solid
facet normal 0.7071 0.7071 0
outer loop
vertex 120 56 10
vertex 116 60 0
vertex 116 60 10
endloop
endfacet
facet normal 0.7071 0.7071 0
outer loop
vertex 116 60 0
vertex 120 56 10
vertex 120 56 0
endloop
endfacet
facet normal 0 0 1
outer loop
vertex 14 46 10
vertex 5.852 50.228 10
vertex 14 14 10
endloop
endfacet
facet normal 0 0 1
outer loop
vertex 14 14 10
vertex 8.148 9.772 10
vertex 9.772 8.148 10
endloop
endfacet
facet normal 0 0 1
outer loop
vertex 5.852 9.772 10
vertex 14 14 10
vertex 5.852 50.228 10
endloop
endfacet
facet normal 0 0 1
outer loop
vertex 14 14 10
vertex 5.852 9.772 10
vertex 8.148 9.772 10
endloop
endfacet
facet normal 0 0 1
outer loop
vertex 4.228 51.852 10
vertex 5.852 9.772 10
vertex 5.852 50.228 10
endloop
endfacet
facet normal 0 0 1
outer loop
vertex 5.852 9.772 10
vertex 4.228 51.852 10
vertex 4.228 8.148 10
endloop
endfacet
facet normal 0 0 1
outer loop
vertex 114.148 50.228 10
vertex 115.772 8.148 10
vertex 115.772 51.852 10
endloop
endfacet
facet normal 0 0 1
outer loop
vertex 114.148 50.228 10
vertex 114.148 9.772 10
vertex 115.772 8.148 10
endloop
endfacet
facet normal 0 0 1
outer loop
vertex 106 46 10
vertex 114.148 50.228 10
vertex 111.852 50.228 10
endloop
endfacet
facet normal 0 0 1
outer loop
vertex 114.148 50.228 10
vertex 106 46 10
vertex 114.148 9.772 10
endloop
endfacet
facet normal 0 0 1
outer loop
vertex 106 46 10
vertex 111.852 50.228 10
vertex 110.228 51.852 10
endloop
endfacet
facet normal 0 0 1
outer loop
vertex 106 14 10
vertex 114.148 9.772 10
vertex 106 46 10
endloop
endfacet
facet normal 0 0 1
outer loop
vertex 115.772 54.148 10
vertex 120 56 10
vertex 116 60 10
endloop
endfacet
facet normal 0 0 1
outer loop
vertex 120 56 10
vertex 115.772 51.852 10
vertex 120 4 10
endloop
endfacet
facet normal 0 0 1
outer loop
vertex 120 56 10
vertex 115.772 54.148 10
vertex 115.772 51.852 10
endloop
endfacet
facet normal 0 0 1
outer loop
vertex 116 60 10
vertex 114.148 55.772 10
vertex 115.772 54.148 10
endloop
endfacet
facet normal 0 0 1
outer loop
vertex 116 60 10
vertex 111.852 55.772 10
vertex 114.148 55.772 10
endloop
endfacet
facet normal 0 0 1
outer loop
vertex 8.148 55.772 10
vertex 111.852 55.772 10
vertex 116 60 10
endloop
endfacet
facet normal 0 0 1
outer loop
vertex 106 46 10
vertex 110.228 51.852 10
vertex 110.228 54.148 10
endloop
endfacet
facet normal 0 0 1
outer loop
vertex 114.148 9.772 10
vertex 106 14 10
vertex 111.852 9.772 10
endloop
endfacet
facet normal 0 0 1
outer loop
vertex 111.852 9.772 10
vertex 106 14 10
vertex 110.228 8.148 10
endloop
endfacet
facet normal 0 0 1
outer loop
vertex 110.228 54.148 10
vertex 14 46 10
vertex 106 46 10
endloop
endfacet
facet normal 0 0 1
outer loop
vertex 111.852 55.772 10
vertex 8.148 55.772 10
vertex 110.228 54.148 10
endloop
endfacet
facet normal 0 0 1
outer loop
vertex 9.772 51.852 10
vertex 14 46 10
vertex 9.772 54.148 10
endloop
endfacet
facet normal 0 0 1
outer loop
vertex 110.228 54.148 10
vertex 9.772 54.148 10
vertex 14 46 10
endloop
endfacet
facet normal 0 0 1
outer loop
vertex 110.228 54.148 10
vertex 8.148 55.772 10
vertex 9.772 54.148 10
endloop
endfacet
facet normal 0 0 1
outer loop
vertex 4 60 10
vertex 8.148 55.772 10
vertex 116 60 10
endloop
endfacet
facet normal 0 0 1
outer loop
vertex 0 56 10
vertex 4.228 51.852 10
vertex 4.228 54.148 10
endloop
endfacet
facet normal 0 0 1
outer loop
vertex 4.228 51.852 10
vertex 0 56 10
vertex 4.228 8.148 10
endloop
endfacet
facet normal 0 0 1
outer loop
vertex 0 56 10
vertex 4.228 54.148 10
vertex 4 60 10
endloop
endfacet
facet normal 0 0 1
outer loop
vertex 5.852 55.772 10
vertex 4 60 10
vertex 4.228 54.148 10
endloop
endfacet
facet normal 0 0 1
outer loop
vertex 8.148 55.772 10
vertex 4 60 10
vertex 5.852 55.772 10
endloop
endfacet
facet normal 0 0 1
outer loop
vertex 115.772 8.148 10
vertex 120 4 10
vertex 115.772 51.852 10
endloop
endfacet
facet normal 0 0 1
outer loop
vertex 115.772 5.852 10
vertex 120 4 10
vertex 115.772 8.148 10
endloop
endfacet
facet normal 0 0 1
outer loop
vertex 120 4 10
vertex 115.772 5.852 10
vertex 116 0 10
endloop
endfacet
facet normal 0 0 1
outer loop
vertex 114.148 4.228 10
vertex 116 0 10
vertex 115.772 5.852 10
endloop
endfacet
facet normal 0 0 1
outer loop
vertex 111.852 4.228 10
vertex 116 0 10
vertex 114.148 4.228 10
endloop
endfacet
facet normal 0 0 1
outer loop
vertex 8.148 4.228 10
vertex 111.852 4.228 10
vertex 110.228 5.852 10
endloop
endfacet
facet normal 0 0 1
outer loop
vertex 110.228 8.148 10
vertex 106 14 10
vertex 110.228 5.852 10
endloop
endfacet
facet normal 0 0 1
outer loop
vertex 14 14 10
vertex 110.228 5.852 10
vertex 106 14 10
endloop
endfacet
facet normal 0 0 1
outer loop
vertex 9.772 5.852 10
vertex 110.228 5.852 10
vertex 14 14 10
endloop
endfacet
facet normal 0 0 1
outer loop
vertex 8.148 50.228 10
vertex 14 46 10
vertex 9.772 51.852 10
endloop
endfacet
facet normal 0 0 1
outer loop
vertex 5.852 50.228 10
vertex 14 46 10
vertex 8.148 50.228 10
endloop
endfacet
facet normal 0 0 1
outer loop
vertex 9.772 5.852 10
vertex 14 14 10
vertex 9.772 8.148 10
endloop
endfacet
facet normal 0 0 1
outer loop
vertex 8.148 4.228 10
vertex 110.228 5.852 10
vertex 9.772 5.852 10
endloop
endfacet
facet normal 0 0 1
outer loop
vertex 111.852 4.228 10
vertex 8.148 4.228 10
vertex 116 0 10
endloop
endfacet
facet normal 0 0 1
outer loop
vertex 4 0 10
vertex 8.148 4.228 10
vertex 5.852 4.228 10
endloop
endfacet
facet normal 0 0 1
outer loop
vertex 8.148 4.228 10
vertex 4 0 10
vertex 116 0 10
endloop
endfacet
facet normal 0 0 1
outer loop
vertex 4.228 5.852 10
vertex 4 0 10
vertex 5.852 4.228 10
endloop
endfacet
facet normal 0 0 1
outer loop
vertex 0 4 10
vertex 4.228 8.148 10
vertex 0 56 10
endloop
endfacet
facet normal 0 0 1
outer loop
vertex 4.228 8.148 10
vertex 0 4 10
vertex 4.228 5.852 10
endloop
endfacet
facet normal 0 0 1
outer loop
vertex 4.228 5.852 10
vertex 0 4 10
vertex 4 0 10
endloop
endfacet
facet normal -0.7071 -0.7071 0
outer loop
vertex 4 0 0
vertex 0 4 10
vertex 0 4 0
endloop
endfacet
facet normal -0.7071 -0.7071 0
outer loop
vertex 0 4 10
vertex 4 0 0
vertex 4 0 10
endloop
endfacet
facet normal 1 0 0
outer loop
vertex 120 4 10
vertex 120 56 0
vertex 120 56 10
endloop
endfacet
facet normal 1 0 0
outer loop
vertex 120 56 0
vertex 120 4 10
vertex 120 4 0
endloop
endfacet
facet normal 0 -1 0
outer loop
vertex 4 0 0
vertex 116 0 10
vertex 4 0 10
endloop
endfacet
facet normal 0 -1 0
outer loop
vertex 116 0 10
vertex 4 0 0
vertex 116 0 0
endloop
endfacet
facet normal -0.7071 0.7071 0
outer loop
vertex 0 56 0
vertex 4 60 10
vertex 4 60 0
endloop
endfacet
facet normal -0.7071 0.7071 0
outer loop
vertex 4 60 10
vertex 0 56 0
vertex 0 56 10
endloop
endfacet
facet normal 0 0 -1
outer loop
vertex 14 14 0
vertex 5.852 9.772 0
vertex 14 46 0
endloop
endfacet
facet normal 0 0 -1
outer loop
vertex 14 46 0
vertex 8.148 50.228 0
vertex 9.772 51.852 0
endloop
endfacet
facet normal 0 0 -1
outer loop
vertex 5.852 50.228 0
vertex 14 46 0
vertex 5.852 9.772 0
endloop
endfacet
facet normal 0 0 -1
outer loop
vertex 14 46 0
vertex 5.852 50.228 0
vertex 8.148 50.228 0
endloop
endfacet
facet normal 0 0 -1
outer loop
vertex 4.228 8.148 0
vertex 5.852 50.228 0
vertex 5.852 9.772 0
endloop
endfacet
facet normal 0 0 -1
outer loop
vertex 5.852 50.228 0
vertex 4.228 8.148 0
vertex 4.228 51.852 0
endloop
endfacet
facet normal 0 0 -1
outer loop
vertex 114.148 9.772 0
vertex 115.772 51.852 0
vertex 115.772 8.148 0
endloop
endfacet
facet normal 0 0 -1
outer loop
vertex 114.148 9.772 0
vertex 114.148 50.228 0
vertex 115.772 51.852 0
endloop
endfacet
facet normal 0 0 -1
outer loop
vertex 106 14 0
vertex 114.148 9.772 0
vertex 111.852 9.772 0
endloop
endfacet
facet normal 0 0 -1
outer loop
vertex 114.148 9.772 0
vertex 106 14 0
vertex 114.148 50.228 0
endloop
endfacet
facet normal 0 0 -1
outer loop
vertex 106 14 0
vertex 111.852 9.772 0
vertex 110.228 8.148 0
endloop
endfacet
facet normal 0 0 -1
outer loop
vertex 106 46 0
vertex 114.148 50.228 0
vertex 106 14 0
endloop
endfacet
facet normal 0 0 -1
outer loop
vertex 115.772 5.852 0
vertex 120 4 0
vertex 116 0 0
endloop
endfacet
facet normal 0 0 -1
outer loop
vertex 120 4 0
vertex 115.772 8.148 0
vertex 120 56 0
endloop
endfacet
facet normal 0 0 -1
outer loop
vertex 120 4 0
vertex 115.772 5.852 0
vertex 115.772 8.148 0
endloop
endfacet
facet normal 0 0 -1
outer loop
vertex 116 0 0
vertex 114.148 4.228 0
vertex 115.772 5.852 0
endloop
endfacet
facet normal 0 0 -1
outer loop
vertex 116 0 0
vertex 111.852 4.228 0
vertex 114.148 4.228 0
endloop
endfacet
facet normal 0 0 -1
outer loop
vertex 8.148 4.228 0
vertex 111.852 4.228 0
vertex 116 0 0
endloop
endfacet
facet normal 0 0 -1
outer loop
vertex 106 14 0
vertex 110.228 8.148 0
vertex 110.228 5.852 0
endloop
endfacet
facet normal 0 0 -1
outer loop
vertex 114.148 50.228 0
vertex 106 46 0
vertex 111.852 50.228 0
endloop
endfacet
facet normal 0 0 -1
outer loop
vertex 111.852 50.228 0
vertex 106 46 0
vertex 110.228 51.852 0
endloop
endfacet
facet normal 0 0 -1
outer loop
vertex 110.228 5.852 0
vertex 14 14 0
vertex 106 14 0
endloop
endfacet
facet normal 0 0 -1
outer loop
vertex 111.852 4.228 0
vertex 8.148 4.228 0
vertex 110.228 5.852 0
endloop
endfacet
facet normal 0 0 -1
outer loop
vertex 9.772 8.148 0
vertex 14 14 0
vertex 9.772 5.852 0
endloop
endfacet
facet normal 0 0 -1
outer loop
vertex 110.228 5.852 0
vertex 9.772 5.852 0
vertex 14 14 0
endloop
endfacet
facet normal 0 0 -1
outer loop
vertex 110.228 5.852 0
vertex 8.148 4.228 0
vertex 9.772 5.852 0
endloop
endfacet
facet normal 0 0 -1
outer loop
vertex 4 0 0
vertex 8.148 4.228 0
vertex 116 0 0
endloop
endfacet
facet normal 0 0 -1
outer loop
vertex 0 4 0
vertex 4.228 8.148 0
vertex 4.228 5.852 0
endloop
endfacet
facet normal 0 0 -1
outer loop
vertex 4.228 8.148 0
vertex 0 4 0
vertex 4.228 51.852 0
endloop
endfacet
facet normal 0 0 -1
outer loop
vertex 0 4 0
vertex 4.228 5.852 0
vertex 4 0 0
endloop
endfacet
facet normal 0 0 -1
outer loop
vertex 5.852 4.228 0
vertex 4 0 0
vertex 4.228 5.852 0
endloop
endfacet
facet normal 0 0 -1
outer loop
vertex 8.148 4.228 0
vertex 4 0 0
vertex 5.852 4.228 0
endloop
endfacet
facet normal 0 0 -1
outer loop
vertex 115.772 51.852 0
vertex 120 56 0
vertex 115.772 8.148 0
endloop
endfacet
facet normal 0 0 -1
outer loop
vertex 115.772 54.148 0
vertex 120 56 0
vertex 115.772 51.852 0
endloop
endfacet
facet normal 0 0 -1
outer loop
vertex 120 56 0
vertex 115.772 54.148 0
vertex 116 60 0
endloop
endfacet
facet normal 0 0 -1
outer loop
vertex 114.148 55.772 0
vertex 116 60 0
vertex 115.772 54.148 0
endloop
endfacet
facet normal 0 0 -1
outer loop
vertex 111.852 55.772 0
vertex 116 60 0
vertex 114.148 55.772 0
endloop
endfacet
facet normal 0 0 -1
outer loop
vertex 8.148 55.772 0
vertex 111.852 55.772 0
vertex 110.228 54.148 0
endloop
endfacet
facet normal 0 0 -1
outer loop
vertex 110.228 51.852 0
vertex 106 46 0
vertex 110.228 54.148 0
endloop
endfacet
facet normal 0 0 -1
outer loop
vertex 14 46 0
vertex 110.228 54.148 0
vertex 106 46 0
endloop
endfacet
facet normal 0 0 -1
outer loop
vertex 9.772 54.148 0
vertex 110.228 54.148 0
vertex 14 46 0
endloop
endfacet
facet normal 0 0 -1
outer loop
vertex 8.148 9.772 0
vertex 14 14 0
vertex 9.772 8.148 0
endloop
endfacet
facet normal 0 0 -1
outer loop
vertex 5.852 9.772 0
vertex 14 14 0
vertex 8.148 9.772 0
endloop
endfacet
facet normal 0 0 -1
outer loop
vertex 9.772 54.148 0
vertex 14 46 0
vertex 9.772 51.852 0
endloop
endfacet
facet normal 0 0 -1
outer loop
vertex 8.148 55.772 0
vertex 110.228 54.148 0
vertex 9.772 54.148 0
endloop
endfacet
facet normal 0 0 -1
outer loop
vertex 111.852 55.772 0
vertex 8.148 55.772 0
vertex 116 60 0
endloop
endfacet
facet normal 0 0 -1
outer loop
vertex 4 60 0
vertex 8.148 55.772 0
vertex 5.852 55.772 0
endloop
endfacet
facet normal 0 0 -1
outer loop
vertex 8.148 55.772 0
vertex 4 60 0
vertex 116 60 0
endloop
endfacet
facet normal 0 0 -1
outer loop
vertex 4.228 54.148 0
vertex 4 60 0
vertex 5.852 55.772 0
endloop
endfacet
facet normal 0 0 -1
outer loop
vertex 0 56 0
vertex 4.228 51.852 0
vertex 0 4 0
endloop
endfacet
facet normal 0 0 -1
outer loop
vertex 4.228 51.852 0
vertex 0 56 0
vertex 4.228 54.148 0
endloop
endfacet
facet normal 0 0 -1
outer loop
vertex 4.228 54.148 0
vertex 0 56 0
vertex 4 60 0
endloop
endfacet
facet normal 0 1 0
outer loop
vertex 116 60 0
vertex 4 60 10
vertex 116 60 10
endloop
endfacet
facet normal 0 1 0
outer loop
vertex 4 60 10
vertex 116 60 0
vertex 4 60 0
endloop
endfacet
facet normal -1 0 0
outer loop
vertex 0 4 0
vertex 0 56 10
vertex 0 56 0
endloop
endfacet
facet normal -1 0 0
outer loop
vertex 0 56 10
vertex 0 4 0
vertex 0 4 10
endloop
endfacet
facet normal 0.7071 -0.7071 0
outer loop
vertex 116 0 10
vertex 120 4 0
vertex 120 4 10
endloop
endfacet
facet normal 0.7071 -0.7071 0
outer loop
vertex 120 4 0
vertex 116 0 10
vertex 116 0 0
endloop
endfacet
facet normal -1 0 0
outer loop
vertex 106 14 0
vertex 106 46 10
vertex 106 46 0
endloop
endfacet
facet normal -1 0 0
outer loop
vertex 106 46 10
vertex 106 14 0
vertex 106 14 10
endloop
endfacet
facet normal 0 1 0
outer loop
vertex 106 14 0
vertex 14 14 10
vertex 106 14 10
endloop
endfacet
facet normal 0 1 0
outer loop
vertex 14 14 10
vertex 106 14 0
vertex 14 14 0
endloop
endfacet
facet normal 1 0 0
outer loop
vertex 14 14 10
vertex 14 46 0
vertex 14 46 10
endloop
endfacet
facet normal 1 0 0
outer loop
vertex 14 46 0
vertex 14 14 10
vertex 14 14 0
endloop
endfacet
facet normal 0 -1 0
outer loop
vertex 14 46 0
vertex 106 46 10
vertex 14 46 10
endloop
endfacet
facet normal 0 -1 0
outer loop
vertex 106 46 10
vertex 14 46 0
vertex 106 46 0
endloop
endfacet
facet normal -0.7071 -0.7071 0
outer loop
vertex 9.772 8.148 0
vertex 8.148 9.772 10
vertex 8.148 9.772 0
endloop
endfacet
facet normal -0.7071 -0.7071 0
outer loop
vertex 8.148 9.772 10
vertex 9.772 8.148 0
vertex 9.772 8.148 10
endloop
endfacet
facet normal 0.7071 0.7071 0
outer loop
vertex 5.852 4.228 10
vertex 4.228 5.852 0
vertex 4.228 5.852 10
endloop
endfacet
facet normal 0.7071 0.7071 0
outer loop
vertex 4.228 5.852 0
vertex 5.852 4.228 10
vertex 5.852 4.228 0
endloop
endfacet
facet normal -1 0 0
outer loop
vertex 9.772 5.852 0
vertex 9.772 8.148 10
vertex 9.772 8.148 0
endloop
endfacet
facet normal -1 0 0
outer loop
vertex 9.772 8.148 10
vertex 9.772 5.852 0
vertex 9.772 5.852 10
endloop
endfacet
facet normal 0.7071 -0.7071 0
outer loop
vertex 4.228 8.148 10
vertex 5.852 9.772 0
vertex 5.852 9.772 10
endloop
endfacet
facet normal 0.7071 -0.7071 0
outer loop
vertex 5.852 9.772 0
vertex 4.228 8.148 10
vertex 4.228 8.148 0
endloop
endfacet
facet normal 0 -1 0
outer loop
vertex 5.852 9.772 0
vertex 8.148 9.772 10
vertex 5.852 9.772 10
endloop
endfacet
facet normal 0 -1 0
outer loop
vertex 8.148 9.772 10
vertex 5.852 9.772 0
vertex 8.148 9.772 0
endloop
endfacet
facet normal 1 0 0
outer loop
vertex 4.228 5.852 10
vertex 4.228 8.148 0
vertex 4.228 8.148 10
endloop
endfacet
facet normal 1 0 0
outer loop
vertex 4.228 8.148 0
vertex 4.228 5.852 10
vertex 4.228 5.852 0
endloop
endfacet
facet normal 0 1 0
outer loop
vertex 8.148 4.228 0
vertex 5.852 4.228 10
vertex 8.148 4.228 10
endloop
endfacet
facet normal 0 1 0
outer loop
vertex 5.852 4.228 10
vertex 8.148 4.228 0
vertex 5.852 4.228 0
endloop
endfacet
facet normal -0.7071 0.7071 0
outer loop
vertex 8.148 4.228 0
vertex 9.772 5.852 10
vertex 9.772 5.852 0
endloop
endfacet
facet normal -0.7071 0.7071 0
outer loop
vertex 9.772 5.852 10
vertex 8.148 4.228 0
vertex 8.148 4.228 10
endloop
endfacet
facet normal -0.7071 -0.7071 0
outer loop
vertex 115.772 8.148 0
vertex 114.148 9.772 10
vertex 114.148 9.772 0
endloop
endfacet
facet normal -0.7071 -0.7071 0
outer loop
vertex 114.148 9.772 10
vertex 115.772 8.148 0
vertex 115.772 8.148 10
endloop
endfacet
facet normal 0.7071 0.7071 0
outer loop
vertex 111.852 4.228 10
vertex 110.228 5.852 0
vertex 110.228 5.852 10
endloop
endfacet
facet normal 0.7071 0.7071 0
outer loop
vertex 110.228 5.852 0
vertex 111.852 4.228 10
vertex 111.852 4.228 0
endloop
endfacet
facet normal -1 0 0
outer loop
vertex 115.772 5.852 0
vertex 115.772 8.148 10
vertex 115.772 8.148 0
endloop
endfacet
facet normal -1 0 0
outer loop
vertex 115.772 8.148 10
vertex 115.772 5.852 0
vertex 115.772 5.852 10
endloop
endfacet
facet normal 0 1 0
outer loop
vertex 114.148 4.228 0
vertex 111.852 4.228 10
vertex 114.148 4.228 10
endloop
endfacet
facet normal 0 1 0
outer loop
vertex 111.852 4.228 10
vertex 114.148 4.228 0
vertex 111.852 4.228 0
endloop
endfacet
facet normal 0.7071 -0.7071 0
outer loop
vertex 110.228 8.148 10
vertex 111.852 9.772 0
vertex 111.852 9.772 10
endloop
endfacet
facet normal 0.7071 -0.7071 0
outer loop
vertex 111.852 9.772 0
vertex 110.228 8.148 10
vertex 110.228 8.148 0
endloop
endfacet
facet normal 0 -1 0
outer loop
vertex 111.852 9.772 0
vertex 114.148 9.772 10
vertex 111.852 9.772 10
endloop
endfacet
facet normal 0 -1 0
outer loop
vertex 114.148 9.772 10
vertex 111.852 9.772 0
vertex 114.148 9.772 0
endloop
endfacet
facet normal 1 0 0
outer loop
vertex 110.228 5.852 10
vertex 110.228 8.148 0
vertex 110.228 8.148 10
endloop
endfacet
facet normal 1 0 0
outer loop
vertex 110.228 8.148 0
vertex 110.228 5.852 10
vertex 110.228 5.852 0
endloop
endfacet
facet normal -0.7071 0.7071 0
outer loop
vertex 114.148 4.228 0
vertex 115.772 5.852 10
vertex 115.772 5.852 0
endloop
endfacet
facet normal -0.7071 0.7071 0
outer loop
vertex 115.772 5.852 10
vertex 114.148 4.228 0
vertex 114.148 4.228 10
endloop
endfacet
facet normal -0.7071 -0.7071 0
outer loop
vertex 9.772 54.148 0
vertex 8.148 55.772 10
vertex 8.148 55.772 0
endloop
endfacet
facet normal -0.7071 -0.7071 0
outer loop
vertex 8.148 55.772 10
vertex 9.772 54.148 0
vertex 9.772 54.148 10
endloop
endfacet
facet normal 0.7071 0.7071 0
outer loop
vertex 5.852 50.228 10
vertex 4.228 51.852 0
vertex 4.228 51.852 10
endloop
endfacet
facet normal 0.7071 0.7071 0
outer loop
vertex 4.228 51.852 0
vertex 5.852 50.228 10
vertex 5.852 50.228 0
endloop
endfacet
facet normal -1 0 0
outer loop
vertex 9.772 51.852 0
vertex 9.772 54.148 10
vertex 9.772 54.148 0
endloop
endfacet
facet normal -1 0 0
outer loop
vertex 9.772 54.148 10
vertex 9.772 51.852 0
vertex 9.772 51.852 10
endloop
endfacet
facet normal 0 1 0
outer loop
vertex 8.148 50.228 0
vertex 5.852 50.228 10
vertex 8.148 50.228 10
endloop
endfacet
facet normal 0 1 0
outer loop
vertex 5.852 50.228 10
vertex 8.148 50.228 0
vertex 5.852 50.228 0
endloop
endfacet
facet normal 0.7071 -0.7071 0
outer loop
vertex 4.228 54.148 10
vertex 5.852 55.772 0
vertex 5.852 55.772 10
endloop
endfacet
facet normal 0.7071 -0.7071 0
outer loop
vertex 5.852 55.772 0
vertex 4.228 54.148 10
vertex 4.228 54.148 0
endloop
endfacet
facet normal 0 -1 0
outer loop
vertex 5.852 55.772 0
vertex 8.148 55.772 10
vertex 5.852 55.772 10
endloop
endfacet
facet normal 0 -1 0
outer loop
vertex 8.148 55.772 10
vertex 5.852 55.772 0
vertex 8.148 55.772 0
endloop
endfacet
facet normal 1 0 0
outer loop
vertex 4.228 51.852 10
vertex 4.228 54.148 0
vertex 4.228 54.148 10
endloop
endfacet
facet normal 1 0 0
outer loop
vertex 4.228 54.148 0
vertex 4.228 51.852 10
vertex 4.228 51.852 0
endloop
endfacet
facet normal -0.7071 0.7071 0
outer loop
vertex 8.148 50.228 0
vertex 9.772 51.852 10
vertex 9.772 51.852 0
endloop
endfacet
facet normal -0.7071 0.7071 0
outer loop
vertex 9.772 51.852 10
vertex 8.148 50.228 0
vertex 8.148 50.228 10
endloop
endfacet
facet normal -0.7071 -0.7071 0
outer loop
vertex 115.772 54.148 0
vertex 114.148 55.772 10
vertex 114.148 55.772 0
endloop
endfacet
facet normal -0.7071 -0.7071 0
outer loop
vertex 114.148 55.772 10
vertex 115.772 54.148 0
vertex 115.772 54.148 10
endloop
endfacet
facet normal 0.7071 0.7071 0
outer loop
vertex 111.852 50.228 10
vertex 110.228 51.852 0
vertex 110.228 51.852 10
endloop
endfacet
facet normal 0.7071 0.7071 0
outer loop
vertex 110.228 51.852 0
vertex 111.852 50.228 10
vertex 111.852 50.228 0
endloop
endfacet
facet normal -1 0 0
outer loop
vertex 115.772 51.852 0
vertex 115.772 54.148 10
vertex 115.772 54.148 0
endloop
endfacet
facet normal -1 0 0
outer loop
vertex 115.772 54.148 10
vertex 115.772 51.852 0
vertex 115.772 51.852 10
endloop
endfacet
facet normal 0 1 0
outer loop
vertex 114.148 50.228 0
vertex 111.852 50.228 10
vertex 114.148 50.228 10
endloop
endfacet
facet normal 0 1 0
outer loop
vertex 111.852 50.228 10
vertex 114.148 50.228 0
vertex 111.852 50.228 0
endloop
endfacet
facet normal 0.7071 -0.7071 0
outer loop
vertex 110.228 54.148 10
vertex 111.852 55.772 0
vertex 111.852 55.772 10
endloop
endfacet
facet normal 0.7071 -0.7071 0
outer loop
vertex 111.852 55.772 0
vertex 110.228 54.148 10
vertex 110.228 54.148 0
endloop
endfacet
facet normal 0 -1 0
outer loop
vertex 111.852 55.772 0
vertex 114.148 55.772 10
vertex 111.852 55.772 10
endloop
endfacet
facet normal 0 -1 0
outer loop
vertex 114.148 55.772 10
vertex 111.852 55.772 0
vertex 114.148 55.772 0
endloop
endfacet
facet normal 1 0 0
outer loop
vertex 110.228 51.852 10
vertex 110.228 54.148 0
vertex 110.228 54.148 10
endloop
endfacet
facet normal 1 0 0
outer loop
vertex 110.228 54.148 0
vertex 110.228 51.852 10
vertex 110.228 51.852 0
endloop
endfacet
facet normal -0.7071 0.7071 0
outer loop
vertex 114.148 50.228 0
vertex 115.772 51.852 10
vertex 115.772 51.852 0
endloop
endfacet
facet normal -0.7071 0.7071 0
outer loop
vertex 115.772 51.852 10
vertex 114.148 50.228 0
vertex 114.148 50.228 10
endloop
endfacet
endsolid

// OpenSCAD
$fn = 32;

// ----------------------------------------------------------------------
// Frame plate: 120 x 60 frame, 14 mm rails
// ----------------------------------------------------------------------

// --- parameters (mm) ---
plate_l = 120;            // plate length, X
plate_w = 60;             // plate width, Y
plate_t = 10;             // plate thickness, Z (extrusion height)
corner_c = 4;             // corner chamfer
frame_bar = 14;           // frame rail width
bolt_r = 3;               // corner bolt window radius
bolt_inset = 7;           // bolt centre inset from the edges

win_l = plate_l - 2 * frame_bar;  // window length
win_w = plate_w - 2 * frame_bar;  // window width
bolt_d = 2 * bolt_r;  // corner hole diameter

profile = [[4, 0], [116, 0], [120, 4], [120, 56], [116, 60], [4, 60], [0, 56], [0, 4]];  // primary outline, 8 points, counter clockwise
void_1 = [[14, 14], [106, 14], [106, 46], [14, 46]];  // the window, 4 points
void_2 = [[9.772, 8.148], [8.148, 9.772], [5.852, 9.772], [4.228, 8.148], [4.228, 5.852], [5.852, 4.228], [8.148, 4.228], [9.772, 5.852]];  // corner bolt window, 8 points
void_3 = [[115.772, 8.148], [114.148, 9.772], [111.852, 9.772], [110.228, 8.148], [110.228, 5.852], [111.852, 4.228], [114.148, 4.228], [115.772, 5.852]];  // corner bolt window, 8 points
void_4 = [[9.772, 54.148], [8.148, 55.772], [5.852, 55.772], [4.228, 54.148], [4.228, 51.852], [5.852, 50.228], [8.148, 50.228], [9.772, 51.852]];  // corner bolt window, 8 points
void_5 = [[115.772, 54.148], [114.148, 55.772], [111.852, 55.772], [110.228, 54.148], [110.228, 51.852], [111.852, 50.228], [114.148, 50.228], [115.772, 51.852]];  // corner bolt window, 8 points

// --- the one profile operation ---
difference() {
  linear_extrude(height = plate_t) polygon(points = profile);
  translate([0, 0, -1])
    linear_extrude(height = plate_t + 2) polygon(points = void_1);
  translate([0, 0, -1])
    linear_extrude(height = plate_t + 2) polygon(points = void_2);
  translate([0, 0, -1])
    linear_extrude(height = plate_t + 2) polygon(points = void_3);
  translate([0, 0, -1])
    linear_extrude(height = plate_t + 2) polygon(points = void_4);
  translate([0, 0, -1])
    linear_extrude(height = plate_t + 2) polygon(points = void_5);
}
